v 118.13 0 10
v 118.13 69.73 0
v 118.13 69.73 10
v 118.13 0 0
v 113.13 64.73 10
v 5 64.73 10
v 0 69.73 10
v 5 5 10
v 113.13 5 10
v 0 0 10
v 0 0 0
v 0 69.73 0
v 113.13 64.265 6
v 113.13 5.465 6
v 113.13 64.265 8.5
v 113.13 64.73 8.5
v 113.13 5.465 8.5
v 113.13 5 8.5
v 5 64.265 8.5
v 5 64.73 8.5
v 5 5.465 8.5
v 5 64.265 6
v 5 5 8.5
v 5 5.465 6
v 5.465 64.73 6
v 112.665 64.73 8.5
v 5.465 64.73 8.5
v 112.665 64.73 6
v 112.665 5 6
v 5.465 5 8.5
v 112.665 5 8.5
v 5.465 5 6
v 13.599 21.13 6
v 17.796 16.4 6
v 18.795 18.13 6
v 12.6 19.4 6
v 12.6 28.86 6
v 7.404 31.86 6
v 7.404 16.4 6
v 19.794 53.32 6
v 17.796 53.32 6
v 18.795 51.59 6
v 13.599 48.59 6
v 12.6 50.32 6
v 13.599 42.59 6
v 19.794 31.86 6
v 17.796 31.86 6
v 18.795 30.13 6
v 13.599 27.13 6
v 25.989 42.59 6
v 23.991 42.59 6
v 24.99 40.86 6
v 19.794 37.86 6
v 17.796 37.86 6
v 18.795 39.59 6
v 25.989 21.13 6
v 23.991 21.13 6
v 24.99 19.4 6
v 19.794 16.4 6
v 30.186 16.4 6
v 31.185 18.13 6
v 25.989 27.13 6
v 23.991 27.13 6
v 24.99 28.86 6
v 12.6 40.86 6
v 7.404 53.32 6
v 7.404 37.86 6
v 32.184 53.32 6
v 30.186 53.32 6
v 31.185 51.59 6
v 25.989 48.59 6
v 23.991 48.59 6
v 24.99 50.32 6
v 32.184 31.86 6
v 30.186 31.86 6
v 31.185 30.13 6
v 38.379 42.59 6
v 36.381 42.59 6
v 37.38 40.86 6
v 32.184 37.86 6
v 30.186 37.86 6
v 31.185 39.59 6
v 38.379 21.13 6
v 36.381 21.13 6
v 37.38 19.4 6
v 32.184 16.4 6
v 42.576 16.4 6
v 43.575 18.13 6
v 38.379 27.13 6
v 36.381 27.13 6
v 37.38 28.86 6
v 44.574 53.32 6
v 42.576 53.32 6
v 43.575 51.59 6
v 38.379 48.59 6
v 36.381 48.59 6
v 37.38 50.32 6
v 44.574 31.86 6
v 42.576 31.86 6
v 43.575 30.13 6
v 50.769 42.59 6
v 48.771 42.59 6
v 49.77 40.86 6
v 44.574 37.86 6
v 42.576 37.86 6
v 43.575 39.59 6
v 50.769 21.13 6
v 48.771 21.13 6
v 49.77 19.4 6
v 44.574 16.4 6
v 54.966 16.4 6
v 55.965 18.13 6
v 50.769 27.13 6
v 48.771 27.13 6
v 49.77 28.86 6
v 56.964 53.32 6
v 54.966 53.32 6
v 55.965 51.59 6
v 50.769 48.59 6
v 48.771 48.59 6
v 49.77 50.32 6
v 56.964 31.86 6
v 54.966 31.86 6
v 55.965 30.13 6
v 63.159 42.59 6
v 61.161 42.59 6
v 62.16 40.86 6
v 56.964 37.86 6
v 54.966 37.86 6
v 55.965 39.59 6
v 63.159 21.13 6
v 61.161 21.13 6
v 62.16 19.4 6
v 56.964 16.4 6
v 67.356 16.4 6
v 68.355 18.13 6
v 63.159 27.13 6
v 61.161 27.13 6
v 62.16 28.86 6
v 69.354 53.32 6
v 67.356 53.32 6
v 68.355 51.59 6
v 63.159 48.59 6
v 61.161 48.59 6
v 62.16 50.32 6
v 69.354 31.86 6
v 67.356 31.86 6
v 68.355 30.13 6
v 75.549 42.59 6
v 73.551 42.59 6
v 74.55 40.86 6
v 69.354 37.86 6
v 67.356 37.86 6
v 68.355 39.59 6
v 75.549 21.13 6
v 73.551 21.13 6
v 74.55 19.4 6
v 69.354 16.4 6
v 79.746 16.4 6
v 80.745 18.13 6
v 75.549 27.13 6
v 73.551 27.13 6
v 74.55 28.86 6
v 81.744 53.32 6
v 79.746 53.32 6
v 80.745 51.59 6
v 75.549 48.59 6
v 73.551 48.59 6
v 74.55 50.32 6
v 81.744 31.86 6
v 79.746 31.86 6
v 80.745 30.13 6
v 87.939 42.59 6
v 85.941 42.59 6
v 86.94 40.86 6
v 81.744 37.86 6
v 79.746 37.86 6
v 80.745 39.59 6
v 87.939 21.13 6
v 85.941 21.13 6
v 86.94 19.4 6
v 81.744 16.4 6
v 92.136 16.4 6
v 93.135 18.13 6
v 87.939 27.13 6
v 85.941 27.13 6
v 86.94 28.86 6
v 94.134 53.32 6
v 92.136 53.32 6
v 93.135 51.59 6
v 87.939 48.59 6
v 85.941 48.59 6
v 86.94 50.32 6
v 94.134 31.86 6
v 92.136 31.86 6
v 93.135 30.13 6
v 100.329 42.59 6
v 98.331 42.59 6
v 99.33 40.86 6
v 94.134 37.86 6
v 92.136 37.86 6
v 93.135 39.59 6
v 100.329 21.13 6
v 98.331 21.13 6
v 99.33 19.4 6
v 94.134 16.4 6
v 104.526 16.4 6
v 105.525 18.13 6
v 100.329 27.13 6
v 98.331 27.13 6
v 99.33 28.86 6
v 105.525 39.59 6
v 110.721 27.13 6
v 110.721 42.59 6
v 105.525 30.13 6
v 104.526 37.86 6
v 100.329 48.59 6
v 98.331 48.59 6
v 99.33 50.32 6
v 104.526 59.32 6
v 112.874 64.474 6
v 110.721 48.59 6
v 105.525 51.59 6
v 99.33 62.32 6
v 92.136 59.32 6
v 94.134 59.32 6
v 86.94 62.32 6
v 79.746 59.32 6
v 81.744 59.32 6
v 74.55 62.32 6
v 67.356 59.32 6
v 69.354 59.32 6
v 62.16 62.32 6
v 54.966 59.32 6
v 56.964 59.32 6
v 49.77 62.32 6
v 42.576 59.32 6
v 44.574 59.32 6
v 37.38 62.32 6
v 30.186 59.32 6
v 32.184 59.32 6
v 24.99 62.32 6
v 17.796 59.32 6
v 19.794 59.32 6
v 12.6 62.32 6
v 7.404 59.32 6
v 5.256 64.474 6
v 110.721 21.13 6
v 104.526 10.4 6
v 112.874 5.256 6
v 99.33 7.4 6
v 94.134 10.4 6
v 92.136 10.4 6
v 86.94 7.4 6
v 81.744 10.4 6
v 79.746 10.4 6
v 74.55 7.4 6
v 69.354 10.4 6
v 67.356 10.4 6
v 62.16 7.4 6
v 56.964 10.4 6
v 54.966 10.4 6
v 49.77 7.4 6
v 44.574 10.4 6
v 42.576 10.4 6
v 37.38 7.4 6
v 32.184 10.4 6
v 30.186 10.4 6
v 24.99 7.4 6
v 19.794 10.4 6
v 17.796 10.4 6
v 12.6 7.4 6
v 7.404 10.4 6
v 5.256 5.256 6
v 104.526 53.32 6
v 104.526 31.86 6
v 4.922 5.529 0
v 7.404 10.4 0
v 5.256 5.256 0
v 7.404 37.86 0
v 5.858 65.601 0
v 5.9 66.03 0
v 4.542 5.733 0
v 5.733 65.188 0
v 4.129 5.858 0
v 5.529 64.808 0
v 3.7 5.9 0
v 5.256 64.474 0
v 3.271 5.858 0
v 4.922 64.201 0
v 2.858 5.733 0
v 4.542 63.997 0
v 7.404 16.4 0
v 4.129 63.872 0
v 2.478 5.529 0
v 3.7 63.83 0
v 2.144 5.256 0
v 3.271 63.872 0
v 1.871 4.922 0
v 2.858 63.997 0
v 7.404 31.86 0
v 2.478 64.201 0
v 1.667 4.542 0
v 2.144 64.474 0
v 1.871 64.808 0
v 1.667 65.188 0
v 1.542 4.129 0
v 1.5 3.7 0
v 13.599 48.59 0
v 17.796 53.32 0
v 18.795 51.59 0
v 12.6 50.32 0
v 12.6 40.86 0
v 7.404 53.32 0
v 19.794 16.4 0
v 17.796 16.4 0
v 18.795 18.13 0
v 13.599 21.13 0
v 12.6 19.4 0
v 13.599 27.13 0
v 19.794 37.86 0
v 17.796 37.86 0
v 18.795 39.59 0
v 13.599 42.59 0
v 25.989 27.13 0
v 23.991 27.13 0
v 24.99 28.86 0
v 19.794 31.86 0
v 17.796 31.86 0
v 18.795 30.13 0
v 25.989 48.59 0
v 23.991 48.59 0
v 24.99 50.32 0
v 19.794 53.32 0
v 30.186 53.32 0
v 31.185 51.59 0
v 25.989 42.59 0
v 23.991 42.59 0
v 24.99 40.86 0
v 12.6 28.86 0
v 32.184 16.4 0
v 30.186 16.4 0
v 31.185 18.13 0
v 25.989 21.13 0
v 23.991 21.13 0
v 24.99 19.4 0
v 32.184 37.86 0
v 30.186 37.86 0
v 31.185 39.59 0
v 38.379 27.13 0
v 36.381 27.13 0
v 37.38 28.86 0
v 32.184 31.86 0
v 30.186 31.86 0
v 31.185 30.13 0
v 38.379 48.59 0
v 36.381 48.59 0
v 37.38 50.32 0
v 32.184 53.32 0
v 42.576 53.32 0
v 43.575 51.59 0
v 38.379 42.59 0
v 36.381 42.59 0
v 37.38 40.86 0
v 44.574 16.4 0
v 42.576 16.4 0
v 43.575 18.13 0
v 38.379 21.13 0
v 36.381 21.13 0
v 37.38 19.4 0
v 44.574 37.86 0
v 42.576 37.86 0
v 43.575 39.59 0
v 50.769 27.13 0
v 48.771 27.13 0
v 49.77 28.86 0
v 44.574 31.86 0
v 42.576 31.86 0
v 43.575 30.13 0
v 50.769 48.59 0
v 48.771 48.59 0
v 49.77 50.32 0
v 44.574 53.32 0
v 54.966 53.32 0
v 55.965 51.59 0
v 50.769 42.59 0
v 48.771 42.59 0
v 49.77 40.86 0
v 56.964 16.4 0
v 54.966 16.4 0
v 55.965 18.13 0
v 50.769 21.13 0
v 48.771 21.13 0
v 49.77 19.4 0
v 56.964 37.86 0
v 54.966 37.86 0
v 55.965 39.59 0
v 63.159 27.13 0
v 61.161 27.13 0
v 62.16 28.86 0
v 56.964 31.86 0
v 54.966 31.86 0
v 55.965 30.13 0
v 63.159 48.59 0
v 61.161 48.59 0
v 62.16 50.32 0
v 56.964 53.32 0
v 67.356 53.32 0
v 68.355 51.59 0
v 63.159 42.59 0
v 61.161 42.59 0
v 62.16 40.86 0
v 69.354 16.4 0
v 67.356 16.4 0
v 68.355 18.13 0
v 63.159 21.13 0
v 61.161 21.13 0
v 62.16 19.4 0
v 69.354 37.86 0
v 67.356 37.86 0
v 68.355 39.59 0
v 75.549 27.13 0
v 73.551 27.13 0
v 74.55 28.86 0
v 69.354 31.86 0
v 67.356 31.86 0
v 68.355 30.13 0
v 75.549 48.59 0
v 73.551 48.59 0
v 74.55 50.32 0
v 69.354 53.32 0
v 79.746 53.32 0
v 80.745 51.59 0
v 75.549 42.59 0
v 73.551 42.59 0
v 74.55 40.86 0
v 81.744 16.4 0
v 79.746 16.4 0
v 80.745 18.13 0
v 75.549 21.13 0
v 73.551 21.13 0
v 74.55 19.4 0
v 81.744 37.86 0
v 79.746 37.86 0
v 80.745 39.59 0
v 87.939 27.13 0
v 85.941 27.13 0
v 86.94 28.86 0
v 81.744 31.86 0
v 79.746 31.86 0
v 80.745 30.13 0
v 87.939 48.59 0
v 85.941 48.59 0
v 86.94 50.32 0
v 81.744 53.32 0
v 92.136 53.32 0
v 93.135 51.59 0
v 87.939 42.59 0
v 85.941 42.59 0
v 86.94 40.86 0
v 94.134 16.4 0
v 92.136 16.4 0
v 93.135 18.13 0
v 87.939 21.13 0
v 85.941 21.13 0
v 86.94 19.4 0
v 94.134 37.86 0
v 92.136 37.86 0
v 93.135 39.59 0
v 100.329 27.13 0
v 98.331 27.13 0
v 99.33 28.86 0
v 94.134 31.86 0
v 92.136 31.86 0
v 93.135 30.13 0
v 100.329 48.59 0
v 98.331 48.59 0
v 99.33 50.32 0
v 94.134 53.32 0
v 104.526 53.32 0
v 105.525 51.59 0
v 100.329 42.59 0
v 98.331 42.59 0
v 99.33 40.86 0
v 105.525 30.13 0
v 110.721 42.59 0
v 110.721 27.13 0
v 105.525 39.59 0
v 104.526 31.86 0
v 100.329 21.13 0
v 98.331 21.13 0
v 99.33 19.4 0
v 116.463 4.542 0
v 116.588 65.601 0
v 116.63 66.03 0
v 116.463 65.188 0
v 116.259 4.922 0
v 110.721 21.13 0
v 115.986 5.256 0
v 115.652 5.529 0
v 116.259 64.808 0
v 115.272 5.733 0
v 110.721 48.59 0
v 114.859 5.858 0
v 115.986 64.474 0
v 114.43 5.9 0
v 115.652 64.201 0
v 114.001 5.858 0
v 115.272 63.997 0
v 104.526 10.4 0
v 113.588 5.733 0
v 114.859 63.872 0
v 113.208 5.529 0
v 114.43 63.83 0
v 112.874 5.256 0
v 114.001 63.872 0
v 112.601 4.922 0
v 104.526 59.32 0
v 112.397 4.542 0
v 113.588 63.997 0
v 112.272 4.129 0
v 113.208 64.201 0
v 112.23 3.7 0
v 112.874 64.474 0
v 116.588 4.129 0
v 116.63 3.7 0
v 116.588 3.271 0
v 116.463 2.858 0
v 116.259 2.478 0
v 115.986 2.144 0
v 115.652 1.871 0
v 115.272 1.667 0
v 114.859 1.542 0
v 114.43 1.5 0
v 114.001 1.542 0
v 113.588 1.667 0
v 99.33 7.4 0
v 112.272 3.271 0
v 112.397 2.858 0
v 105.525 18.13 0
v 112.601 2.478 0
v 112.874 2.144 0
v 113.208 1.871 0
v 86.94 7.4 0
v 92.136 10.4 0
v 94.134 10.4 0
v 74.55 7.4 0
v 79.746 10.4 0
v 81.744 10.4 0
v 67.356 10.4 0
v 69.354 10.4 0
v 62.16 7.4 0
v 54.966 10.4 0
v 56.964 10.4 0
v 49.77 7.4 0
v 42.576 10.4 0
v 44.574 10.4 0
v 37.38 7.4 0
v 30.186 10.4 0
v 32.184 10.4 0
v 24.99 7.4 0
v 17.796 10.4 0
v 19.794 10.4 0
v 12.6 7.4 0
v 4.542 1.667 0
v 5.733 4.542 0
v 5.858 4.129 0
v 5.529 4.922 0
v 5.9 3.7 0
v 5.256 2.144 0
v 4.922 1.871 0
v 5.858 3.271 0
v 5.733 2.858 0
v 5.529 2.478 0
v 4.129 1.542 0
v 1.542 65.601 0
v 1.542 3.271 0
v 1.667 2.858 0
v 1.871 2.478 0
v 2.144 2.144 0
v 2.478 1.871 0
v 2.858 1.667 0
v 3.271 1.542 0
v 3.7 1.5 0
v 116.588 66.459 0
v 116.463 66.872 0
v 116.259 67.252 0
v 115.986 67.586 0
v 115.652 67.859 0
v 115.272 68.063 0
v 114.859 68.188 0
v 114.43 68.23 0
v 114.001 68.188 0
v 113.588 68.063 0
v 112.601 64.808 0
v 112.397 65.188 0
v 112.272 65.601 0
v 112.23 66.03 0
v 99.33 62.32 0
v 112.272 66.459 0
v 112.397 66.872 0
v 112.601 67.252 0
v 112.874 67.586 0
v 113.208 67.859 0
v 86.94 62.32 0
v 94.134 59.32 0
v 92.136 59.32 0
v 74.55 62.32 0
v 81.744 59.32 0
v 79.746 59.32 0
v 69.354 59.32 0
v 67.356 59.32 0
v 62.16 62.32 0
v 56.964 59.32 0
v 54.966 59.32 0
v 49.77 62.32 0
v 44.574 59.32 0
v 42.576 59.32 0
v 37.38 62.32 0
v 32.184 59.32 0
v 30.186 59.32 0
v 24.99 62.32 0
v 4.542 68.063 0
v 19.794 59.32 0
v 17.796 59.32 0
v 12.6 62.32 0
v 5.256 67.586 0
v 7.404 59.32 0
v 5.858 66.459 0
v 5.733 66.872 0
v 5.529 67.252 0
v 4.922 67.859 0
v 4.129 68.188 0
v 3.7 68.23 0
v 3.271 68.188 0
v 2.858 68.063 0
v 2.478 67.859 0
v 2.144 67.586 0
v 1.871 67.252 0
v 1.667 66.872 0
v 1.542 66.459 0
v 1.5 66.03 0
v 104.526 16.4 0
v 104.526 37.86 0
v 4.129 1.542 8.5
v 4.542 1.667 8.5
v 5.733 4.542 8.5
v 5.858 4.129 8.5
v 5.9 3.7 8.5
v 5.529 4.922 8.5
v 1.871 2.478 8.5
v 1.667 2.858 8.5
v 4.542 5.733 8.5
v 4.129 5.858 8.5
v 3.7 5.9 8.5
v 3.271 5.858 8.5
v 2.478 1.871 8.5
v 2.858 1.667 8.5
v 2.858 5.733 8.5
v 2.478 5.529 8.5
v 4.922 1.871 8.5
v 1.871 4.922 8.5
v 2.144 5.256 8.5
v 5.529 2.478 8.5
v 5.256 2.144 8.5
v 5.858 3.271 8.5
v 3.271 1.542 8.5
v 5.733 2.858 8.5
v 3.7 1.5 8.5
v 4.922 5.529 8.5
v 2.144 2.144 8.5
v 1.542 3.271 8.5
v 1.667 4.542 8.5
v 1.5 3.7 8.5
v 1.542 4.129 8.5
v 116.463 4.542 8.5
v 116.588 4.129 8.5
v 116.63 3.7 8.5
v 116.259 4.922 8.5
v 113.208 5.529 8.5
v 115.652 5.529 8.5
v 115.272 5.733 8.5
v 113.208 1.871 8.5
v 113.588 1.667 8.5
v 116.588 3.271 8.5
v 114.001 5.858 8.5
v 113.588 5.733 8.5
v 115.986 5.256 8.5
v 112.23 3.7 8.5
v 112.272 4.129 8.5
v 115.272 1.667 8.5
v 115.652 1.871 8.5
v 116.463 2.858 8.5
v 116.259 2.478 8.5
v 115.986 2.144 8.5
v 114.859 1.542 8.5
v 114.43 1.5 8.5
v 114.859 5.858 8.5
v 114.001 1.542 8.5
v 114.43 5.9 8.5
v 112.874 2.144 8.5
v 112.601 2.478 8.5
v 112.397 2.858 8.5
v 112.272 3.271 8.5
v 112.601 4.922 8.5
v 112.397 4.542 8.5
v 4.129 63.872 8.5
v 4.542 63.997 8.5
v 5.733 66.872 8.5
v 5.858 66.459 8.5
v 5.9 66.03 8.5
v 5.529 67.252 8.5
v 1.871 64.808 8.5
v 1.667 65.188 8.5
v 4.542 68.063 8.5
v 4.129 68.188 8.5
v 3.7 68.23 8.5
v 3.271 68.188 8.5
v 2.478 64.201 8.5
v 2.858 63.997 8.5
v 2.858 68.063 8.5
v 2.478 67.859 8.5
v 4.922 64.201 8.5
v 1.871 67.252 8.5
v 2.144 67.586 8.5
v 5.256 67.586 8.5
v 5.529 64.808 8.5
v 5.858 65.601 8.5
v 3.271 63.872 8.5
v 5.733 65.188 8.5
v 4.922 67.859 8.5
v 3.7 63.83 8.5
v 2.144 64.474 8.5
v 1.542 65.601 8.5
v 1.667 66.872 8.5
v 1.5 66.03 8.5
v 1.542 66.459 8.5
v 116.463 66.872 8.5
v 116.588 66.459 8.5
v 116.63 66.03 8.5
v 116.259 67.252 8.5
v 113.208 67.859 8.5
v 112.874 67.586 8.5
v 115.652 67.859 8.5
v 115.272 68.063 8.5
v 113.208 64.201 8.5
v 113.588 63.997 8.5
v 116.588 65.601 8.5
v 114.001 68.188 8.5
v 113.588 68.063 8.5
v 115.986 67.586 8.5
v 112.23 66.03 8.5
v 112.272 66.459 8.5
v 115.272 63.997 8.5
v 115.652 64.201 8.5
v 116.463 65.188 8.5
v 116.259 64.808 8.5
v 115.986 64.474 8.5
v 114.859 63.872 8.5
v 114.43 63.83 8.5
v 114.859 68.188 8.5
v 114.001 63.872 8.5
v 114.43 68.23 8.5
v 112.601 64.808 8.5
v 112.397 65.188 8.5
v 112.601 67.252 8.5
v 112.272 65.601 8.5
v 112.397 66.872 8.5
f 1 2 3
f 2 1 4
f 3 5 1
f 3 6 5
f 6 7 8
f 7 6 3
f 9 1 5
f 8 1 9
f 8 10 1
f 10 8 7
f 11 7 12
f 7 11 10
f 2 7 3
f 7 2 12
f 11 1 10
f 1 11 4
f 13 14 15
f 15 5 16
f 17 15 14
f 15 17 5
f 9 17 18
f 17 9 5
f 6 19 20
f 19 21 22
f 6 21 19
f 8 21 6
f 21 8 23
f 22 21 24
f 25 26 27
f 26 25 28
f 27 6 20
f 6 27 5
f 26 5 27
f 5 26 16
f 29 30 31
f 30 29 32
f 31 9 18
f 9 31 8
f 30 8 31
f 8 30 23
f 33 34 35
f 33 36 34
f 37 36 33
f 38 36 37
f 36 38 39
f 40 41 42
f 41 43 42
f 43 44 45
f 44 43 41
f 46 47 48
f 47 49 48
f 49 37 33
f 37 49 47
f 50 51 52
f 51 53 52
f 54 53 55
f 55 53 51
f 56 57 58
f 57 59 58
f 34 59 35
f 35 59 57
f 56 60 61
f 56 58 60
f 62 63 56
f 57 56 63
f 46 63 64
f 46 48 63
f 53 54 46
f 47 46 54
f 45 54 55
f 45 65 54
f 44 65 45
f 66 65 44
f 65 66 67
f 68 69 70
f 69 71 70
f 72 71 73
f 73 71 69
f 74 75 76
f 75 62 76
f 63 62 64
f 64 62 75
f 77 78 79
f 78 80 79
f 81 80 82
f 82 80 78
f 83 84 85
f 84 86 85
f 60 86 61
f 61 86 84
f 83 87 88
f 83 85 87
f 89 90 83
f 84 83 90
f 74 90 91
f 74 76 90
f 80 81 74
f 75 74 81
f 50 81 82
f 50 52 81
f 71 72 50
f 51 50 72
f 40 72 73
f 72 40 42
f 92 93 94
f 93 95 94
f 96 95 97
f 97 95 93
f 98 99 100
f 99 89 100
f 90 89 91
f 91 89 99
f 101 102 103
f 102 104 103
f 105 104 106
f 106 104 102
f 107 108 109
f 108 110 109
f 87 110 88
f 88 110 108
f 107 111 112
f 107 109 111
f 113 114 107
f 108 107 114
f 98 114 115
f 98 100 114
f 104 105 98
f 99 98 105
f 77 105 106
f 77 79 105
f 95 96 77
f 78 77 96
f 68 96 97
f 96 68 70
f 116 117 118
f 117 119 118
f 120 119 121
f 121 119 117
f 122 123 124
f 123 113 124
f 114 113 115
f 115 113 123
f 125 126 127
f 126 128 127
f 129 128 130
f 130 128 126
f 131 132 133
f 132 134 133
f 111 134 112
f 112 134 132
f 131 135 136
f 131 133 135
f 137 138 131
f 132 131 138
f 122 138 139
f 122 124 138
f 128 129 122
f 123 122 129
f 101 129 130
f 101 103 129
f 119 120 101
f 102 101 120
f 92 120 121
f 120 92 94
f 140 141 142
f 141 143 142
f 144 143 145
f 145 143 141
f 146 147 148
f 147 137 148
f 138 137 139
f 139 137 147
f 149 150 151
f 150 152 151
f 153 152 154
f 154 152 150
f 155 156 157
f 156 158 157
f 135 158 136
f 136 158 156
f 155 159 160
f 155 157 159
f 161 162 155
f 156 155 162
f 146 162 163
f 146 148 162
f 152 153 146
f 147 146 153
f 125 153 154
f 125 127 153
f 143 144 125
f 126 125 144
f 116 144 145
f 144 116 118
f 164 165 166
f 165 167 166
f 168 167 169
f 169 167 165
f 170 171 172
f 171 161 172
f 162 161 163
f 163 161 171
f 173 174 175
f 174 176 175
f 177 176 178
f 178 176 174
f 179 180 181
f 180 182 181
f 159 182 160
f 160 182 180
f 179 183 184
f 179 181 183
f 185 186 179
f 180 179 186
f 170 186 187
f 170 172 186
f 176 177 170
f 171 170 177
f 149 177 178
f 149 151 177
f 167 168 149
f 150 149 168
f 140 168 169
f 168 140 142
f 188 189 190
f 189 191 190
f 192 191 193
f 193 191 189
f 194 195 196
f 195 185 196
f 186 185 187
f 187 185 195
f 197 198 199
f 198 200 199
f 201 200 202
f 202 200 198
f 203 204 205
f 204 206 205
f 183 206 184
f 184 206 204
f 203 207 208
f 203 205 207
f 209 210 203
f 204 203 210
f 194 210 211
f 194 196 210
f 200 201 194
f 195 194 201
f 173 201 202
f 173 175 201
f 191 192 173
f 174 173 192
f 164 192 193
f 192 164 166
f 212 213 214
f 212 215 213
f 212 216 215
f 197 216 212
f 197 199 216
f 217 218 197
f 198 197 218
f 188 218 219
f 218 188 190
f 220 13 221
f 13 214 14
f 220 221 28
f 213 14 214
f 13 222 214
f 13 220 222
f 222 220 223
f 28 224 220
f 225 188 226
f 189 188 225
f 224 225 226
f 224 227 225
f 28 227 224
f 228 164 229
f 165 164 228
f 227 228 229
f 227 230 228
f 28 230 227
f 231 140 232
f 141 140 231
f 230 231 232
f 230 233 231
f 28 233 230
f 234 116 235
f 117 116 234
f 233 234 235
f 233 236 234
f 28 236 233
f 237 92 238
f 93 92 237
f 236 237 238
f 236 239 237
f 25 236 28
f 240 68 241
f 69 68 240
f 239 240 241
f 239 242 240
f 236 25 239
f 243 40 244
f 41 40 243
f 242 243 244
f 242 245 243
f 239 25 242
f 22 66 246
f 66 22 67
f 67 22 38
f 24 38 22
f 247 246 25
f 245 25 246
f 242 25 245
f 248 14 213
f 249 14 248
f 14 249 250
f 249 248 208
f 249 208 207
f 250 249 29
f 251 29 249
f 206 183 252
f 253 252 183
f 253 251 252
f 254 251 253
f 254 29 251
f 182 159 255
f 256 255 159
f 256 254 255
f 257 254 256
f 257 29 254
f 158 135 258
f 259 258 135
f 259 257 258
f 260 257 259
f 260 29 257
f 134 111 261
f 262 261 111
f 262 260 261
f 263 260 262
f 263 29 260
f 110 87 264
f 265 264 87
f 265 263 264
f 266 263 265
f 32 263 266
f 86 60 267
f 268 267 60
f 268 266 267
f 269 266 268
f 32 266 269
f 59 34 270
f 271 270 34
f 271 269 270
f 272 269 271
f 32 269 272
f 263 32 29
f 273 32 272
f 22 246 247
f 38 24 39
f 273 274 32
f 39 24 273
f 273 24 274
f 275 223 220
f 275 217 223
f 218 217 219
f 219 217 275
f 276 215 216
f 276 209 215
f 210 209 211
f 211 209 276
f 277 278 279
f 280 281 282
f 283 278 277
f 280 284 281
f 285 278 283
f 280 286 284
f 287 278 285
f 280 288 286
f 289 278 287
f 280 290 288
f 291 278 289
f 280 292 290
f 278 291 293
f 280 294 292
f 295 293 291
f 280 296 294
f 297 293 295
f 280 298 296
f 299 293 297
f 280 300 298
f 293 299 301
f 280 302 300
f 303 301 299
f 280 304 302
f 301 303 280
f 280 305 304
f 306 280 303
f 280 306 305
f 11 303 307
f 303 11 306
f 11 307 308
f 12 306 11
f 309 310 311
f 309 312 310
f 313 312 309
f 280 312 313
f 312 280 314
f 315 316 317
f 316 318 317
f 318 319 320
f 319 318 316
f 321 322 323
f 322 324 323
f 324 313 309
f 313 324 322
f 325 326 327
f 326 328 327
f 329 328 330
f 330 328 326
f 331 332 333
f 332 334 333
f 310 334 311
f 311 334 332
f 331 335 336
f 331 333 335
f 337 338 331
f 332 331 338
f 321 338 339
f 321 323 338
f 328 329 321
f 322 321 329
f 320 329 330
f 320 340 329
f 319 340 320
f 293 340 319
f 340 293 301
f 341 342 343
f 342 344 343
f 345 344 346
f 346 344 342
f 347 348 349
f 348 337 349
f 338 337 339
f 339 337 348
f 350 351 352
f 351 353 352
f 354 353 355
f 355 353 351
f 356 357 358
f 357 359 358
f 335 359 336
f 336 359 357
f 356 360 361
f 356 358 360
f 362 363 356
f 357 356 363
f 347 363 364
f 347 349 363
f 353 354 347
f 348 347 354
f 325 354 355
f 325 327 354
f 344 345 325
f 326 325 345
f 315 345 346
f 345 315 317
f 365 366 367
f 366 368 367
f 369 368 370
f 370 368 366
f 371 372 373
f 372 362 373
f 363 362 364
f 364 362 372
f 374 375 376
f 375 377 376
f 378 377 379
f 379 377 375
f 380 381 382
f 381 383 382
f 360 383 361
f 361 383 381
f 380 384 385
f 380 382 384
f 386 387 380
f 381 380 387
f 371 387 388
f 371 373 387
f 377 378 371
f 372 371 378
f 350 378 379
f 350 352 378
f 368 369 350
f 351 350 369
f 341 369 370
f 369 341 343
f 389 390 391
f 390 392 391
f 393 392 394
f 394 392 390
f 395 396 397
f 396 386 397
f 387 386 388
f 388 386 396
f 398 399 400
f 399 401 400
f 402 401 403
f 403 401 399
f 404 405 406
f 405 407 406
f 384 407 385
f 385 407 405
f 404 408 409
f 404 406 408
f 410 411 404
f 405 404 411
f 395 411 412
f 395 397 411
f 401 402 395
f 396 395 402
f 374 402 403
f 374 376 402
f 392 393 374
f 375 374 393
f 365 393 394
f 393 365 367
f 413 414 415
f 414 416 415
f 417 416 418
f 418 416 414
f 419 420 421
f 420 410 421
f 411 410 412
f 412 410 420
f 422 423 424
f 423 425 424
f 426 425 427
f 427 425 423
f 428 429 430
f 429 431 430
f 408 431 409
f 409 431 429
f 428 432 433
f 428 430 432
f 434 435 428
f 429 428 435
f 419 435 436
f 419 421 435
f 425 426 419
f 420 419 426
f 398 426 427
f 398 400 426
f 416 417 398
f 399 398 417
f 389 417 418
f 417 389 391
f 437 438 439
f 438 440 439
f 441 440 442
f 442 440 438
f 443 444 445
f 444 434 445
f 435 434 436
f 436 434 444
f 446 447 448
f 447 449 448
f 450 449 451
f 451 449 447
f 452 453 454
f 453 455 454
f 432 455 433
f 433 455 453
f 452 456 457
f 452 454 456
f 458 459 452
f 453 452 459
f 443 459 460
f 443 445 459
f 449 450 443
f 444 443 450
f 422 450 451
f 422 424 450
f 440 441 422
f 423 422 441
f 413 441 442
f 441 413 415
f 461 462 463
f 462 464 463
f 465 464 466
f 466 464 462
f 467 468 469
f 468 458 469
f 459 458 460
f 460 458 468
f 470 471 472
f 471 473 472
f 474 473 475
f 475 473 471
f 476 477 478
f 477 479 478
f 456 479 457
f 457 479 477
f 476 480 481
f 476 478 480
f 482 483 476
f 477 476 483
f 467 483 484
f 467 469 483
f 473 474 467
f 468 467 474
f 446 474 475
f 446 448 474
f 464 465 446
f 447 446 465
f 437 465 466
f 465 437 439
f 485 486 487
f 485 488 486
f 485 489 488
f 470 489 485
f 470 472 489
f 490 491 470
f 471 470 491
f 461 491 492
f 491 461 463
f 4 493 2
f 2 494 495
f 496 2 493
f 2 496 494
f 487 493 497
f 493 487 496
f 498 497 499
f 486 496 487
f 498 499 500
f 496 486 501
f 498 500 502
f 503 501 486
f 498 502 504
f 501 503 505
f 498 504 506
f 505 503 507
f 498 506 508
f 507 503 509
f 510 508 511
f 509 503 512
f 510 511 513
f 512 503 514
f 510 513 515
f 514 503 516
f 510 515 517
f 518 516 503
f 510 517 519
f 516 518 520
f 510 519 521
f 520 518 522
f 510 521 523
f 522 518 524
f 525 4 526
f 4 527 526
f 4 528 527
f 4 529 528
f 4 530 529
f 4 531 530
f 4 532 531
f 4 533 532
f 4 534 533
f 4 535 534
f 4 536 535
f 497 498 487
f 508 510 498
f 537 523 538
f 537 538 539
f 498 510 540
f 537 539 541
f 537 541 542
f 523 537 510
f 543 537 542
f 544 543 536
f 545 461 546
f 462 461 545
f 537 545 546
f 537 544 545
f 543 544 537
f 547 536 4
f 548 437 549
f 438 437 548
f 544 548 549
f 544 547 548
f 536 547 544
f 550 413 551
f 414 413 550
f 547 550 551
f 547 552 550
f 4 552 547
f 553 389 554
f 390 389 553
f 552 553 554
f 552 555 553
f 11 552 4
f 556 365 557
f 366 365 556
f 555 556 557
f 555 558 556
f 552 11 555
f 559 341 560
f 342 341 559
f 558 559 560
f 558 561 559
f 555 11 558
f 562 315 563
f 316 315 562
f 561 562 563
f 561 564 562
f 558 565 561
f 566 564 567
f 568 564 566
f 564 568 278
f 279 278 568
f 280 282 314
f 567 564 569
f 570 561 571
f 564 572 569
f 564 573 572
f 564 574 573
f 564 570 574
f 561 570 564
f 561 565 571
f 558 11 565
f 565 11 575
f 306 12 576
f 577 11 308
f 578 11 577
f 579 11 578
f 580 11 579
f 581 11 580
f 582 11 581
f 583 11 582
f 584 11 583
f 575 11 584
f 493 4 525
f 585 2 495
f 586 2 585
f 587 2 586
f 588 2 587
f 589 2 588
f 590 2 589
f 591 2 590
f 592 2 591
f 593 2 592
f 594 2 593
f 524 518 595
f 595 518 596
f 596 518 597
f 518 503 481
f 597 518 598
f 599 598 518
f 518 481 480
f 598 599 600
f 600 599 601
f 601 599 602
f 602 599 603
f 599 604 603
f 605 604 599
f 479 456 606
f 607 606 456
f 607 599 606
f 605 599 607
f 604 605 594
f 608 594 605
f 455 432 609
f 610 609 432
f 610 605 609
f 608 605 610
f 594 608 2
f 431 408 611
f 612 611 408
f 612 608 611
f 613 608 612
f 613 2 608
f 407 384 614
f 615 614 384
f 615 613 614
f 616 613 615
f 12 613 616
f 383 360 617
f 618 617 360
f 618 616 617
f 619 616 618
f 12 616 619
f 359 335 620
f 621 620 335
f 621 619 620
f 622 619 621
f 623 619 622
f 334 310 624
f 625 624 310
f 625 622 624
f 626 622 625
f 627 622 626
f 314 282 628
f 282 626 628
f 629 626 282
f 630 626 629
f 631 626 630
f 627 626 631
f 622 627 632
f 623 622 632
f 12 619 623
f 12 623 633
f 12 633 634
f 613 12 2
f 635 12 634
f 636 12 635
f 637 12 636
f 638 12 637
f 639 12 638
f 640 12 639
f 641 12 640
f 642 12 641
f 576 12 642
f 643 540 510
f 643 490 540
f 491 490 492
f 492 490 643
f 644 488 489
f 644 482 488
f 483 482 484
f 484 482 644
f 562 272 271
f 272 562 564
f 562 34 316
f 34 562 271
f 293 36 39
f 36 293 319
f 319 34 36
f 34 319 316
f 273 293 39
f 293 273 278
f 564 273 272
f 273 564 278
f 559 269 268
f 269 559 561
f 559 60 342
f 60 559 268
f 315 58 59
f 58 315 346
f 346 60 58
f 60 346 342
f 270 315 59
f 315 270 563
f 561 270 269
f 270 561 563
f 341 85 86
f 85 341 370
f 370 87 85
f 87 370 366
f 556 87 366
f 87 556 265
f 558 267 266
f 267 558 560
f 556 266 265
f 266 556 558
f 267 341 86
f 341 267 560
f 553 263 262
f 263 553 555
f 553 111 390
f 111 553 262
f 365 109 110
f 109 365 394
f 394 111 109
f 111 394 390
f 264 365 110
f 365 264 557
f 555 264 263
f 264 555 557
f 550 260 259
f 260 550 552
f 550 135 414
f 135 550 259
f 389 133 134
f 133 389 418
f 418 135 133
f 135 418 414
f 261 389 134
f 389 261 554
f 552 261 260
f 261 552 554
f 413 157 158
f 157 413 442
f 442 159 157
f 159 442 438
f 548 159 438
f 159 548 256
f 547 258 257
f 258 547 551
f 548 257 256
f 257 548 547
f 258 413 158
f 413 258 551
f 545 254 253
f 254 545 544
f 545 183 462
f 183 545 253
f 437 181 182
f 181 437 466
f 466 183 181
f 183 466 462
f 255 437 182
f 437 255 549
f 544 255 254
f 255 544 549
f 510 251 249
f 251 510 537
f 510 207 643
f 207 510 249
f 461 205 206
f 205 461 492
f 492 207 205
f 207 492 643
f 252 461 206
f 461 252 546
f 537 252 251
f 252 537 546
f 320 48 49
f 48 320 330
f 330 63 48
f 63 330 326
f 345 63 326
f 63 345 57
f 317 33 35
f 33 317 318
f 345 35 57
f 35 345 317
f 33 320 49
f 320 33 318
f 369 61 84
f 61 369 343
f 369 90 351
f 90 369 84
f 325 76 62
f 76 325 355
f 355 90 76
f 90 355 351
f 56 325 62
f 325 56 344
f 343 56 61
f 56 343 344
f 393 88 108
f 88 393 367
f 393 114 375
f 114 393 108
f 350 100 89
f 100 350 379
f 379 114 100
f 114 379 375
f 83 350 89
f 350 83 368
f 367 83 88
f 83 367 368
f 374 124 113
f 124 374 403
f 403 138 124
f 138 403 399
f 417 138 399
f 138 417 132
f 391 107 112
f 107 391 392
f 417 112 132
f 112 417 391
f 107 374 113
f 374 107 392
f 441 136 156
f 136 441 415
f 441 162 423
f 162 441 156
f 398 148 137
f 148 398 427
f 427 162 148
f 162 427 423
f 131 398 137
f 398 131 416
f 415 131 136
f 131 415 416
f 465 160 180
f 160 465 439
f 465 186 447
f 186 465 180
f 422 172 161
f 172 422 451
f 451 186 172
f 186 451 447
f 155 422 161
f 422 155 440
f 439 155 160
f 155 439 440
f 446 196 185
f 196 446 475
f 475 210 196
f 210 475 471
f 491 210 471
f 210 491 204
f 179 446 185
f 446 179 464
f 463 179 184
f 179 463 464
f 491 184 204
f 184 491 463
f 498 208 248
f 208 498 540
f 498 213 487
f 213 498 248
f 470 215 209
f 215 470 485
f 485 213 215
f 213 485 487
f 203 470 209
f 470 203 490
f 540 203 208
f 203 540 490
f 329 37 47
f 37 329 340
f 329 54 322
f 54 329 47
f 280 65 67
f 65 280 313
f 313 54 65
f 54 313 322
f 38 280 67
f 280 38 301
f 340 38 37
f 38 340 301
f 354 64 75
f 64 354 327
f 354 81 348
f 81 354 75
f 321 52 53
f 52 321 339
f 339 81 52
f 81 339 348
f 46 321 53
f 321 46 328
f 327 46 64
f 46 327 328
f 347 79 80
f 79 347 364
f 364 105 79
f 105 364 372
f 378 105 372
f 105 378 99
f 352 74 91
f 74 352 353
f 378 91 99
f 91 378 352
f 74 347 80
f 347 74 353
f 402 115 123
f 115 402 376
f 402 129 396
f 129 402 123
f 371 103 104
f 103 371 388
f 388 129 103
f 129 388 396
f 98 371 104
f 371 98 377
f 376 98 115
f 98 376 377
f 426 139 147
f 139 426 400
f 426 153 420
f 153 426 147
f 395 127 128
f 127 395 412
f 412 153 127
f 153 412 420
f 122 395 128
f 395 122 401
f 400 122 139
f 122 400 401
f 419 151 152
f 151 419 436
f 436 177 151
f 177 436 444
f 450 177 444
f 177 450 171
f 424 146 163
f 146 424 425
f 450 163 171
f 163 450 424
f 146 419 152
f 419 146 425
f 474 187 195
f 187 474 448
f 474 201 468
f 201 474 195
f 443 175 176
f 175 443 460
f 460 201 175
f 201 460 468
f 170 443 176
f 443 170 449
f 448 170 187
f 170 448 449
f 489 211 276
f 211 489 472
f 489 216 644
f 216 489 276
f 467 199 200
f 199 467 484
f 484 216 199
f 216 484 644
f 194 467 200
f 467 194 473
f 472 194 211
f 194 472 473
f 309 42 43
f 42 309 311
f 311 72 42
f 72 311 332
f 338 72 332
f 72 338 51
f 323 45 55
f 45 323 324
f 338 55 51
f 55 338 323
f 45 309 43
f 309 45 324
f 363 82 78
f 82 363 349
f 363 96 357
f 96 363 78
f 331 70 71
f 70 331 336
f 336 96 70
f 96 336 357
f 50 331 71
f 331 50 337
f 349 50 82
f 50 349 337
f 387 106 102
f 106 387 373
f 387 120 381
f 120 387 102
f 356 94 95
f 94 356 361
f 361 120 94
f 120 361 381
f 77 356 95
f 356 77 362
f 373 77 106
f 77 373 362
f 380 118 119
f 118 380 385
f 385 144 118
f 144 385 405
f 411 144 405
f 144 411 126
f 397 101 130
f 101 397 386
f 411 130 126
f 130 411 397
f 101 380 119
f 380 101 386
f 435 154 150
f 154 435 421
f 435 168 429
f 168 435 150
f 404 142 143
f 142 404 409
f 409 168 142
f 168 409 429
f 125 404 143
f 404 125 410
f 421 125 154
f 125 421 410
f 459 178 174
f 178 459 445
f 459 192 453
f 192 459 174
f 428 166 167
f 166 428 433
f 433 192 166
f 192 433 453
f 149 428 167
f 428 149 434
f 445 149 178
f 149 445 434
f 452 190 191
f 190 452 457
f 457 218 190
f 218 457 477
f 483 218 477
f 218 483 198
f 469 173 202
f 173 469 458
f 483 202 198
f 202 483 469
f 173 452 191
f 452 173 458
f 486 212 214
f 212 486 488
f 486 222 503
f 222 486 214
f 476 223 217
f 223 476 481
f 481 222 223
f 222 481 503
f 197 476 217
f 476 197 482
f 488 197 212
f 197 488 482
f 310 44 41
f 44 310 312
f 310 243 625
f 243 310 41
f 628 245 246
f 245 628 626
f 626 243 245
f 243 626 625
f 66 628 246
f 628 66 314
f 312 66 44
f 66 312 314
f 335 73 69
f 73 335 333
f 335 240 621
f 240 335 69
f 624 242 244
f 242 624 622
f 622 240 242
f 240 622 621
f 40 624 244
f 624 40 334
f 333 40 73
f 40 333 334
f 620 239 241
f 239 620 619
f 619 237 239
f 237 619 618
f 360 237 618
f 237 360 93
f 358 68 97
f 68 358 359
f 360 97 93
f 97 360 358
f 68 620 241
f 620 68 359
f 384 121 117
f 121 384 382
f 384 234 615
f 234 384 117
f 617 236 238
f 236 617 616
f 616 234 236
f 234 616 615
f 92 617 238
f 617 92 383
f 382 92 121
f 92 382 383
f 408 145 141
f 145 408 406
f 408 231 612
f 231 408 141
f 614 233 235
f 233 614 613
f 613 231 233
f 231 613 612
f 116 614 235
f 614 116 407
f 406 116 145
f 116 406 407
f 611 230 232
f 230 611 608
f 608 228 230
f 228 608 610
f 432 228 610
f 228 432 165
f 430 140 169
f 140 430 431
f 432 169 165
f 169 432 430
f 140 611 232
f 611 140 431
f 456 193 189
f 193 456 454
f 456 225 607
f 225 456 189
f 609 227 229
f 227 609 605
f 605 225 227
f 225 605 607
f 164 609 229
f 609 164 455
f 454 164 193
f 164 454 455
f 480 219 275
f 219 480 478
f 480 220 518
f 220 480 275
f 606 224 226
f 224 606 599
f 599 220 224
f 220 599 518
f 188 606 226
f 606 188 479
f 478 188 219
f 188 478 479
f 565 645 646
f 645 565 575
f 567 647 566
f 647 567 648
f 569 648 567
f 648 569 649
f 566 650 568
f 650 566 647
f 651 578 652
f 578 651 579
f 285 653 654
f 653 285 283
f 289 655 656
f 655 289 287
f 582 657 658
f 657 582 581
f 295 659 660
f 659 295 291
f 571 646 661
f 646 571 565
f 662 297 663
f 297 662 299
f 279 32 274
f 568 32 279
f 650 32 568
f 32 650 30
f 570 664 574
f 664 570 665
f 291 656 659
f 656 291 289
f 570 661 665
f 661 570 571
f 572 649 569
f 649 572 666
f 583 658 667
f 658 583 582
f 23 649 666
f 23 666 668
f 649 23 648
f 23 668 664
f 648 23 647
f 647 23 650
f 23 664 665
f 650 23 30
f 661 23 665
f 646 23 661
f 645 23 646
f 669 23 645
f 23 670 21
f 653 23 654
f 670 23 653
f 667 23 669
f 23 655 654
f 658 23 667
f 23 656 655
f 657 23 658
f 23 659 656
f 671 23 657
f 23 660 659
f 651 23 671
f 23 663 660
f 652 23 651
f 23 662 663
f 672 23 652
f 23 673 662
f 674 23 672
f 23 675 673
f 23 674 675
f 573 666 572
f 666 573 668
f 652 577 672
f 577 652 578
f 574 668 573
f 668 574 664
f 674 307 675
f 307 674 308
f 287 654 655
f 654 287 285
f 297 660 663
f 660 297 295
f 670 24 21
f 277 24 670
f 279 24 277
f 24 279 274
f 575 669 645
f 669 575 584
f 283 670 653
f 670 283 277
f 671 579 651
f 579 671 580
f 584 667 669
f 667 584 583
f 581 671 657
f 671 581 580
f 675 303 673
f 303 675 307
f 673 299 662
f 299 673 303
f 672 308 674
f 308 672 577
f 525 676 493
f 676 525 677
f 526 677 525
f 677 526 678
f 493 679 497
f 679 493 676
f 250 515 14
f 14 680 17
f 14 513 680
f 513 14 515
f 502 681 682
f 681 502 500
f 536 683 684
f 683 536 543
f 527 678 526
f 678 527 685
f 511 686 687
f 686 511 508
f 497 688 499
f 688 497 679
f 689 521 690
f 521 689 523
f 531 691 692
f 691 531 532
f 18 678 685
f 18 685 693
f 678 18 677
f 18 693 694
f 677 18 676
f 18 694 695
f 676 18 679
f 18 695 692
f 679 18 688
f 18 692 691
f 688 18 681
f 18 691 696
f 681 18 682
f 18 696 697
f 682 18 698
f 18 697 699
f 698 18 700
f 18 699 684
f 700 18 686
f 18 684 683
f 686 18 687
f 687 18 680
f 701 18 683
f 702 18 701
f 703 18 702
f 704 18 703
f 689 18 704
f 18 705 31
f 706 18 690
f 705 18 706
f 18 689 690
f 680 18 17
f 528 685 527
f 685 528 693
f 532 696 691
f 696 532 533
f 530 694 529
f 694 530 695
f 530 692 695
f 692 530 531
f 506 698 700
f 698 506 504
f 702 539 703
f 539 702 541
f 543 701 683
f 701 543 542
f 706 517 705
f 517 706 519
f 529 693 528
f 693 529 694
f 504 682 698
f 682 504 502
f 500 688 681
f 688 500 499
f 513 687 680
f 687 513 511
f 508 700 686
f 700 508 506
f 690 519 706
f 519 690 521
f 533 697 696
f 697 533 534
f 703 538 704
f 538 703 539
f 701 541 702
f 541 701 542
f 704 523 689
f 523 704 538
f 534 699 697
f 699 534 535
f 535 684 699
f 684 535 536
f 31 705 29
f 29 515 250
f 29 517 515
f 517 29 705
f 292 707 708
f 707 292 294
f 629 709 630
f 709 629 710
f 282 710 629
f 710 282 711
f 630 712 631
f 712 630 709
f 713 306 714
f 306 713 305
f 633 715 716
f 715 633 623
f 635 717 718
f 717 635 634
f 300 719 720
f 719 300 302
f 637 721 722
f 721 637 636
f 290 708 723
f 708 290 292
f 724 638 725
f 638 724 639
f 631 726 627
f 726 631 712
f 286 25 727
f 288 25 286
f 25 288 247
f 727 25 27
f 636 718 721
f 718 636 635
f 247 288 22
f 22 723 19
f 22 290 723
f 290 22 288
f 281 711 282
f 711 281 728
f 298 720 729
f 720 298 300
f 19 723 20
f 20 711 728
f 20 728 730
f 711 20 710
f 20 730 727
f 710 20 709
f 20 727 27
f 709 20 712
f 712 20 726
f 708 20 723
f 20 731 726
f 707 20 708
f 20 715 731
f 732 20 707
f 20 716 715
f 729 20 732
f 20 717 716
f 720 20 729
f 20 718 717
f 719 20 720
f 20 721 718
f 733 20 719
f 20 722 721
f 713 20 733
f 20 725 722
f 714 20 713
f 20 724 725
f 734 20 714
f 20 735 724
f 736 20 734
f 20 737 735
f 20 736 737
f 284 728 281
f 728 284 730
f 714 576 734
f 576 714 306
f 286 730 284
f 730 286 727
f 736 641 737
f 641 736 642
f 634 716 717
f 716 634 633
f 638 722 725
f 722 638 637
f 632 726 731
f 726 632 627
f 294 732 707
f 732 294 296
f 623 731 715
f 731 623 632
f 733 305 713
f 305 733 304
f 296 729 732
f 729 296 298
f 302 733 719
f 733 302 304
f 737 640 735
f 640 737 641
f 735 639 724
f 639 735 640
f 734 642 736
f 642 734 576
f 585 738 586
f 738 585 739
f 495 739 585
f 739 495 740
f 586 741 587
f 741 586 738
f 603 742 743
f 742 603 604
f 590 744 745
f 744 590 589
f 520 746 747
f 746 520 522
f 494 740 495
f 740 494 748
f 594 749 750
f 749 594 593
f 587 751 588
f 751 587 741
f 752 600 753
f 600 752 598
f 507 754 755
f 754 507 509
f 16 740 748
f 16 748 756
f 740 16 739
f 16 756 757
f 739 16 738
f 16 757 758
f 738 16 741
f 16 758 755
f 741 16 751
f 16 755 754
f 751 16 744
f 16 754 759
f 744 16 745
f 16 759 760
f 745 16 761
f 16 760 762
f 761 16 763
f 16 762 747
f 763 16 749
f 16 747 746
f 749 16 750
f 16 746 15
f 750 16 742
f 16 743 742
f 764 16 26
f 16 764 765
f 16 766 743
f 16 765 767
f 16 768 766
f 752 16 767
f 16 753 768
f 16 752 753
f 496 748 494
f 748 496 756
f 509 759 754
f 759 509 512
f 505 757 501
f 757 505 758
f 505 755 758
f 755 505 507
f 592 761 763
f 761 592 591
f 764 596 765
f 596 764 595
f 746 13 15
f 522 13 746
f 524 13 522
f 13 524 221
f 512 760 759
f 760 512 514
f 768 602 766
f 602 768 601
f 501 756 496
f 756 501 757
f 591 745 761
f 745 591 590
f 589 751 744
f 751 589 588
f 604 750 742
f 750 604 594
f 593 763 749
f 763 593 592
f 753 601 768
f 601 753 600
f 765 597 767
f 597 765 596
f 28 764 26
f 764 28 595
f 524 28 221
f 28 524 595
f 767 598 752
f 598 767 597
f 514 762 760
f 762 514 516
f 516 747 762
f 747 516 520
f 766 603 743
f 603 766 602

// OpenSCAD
$fn = 32;

// ----------------------------------------------------------------------
// Honeycomb panel: 118.13 x 69.73 mm, 40 cells of 12 mm
// ----------------------------------------------------------------------

// --- parameters (mm) ---
panel_w = 118.13;         // panel width
panel_d = 69.73;          // panel depth
thick = 6;                // panel thickness
cell_r = 6;               // hex cell circumradius
pitch = 12.39;            // hex cell pitch (centre to centre)
web = 2;                  // web between the cells
columns = 8;              // columns of cells
rows = 5;                 // rows of cells
cell_count = 40;          // total cells
shift_x = 12.6;           // first cell offset in x
shift_y = 13.4;           // first cell offset in y
mount_d = 4.4;            // corner mounting holes
hole_off = 3.7;           // mounting hole offset from the corners
rim_h = 10;               // rim height
rim_t = 5;                // rim wall thickness

difference() {
  union() {
    cube([panel_w, panel_d, thick]);
    /* rim around the panel, sunk 1 mm into the plate */
    translate([0, 0, thick - 1]) difference() {
      cube([panel_w, panel_d, rim_h - thick + 1]);
      translate([rim_t, rim_t, -2.5]) cube([panel_w - 2 * rim_t, panel_d - 2 * rim_t, rim_h - thick + 6]);
    }
  }
  /* hexagonal cells, point-up, cut right through the plate */
  for (row = [0 : rows - 1]) {
    for (col = [0 : columns - 1]) {
      translate([shift_x + col * pitch + (row % 2) * pitch / 2, shift_y + row * pitch * 0.866025, -2.5]) rotate([0, 0, 30]) cylinder(h = thick + 5, d = 2 * cell_r, $fn = 6);
    }
  }
  /* corner mounting holes, clear of the outer cell web */
  translate([3.7, 3.7, -2.5]) cylinder(h = thick + 5, d = mount_d);
  translate([114.43, 3.7, -2.5]) cylinder(h = thick + 5, d = mount_d);
  translate([3.7, 66.03, -2.5]) cylinder(h = thick + 5, d = mount_d);
  translate([114.43, 66.03, -2.5]) cylinder(h = thick + 5, d = mount_d);
}
